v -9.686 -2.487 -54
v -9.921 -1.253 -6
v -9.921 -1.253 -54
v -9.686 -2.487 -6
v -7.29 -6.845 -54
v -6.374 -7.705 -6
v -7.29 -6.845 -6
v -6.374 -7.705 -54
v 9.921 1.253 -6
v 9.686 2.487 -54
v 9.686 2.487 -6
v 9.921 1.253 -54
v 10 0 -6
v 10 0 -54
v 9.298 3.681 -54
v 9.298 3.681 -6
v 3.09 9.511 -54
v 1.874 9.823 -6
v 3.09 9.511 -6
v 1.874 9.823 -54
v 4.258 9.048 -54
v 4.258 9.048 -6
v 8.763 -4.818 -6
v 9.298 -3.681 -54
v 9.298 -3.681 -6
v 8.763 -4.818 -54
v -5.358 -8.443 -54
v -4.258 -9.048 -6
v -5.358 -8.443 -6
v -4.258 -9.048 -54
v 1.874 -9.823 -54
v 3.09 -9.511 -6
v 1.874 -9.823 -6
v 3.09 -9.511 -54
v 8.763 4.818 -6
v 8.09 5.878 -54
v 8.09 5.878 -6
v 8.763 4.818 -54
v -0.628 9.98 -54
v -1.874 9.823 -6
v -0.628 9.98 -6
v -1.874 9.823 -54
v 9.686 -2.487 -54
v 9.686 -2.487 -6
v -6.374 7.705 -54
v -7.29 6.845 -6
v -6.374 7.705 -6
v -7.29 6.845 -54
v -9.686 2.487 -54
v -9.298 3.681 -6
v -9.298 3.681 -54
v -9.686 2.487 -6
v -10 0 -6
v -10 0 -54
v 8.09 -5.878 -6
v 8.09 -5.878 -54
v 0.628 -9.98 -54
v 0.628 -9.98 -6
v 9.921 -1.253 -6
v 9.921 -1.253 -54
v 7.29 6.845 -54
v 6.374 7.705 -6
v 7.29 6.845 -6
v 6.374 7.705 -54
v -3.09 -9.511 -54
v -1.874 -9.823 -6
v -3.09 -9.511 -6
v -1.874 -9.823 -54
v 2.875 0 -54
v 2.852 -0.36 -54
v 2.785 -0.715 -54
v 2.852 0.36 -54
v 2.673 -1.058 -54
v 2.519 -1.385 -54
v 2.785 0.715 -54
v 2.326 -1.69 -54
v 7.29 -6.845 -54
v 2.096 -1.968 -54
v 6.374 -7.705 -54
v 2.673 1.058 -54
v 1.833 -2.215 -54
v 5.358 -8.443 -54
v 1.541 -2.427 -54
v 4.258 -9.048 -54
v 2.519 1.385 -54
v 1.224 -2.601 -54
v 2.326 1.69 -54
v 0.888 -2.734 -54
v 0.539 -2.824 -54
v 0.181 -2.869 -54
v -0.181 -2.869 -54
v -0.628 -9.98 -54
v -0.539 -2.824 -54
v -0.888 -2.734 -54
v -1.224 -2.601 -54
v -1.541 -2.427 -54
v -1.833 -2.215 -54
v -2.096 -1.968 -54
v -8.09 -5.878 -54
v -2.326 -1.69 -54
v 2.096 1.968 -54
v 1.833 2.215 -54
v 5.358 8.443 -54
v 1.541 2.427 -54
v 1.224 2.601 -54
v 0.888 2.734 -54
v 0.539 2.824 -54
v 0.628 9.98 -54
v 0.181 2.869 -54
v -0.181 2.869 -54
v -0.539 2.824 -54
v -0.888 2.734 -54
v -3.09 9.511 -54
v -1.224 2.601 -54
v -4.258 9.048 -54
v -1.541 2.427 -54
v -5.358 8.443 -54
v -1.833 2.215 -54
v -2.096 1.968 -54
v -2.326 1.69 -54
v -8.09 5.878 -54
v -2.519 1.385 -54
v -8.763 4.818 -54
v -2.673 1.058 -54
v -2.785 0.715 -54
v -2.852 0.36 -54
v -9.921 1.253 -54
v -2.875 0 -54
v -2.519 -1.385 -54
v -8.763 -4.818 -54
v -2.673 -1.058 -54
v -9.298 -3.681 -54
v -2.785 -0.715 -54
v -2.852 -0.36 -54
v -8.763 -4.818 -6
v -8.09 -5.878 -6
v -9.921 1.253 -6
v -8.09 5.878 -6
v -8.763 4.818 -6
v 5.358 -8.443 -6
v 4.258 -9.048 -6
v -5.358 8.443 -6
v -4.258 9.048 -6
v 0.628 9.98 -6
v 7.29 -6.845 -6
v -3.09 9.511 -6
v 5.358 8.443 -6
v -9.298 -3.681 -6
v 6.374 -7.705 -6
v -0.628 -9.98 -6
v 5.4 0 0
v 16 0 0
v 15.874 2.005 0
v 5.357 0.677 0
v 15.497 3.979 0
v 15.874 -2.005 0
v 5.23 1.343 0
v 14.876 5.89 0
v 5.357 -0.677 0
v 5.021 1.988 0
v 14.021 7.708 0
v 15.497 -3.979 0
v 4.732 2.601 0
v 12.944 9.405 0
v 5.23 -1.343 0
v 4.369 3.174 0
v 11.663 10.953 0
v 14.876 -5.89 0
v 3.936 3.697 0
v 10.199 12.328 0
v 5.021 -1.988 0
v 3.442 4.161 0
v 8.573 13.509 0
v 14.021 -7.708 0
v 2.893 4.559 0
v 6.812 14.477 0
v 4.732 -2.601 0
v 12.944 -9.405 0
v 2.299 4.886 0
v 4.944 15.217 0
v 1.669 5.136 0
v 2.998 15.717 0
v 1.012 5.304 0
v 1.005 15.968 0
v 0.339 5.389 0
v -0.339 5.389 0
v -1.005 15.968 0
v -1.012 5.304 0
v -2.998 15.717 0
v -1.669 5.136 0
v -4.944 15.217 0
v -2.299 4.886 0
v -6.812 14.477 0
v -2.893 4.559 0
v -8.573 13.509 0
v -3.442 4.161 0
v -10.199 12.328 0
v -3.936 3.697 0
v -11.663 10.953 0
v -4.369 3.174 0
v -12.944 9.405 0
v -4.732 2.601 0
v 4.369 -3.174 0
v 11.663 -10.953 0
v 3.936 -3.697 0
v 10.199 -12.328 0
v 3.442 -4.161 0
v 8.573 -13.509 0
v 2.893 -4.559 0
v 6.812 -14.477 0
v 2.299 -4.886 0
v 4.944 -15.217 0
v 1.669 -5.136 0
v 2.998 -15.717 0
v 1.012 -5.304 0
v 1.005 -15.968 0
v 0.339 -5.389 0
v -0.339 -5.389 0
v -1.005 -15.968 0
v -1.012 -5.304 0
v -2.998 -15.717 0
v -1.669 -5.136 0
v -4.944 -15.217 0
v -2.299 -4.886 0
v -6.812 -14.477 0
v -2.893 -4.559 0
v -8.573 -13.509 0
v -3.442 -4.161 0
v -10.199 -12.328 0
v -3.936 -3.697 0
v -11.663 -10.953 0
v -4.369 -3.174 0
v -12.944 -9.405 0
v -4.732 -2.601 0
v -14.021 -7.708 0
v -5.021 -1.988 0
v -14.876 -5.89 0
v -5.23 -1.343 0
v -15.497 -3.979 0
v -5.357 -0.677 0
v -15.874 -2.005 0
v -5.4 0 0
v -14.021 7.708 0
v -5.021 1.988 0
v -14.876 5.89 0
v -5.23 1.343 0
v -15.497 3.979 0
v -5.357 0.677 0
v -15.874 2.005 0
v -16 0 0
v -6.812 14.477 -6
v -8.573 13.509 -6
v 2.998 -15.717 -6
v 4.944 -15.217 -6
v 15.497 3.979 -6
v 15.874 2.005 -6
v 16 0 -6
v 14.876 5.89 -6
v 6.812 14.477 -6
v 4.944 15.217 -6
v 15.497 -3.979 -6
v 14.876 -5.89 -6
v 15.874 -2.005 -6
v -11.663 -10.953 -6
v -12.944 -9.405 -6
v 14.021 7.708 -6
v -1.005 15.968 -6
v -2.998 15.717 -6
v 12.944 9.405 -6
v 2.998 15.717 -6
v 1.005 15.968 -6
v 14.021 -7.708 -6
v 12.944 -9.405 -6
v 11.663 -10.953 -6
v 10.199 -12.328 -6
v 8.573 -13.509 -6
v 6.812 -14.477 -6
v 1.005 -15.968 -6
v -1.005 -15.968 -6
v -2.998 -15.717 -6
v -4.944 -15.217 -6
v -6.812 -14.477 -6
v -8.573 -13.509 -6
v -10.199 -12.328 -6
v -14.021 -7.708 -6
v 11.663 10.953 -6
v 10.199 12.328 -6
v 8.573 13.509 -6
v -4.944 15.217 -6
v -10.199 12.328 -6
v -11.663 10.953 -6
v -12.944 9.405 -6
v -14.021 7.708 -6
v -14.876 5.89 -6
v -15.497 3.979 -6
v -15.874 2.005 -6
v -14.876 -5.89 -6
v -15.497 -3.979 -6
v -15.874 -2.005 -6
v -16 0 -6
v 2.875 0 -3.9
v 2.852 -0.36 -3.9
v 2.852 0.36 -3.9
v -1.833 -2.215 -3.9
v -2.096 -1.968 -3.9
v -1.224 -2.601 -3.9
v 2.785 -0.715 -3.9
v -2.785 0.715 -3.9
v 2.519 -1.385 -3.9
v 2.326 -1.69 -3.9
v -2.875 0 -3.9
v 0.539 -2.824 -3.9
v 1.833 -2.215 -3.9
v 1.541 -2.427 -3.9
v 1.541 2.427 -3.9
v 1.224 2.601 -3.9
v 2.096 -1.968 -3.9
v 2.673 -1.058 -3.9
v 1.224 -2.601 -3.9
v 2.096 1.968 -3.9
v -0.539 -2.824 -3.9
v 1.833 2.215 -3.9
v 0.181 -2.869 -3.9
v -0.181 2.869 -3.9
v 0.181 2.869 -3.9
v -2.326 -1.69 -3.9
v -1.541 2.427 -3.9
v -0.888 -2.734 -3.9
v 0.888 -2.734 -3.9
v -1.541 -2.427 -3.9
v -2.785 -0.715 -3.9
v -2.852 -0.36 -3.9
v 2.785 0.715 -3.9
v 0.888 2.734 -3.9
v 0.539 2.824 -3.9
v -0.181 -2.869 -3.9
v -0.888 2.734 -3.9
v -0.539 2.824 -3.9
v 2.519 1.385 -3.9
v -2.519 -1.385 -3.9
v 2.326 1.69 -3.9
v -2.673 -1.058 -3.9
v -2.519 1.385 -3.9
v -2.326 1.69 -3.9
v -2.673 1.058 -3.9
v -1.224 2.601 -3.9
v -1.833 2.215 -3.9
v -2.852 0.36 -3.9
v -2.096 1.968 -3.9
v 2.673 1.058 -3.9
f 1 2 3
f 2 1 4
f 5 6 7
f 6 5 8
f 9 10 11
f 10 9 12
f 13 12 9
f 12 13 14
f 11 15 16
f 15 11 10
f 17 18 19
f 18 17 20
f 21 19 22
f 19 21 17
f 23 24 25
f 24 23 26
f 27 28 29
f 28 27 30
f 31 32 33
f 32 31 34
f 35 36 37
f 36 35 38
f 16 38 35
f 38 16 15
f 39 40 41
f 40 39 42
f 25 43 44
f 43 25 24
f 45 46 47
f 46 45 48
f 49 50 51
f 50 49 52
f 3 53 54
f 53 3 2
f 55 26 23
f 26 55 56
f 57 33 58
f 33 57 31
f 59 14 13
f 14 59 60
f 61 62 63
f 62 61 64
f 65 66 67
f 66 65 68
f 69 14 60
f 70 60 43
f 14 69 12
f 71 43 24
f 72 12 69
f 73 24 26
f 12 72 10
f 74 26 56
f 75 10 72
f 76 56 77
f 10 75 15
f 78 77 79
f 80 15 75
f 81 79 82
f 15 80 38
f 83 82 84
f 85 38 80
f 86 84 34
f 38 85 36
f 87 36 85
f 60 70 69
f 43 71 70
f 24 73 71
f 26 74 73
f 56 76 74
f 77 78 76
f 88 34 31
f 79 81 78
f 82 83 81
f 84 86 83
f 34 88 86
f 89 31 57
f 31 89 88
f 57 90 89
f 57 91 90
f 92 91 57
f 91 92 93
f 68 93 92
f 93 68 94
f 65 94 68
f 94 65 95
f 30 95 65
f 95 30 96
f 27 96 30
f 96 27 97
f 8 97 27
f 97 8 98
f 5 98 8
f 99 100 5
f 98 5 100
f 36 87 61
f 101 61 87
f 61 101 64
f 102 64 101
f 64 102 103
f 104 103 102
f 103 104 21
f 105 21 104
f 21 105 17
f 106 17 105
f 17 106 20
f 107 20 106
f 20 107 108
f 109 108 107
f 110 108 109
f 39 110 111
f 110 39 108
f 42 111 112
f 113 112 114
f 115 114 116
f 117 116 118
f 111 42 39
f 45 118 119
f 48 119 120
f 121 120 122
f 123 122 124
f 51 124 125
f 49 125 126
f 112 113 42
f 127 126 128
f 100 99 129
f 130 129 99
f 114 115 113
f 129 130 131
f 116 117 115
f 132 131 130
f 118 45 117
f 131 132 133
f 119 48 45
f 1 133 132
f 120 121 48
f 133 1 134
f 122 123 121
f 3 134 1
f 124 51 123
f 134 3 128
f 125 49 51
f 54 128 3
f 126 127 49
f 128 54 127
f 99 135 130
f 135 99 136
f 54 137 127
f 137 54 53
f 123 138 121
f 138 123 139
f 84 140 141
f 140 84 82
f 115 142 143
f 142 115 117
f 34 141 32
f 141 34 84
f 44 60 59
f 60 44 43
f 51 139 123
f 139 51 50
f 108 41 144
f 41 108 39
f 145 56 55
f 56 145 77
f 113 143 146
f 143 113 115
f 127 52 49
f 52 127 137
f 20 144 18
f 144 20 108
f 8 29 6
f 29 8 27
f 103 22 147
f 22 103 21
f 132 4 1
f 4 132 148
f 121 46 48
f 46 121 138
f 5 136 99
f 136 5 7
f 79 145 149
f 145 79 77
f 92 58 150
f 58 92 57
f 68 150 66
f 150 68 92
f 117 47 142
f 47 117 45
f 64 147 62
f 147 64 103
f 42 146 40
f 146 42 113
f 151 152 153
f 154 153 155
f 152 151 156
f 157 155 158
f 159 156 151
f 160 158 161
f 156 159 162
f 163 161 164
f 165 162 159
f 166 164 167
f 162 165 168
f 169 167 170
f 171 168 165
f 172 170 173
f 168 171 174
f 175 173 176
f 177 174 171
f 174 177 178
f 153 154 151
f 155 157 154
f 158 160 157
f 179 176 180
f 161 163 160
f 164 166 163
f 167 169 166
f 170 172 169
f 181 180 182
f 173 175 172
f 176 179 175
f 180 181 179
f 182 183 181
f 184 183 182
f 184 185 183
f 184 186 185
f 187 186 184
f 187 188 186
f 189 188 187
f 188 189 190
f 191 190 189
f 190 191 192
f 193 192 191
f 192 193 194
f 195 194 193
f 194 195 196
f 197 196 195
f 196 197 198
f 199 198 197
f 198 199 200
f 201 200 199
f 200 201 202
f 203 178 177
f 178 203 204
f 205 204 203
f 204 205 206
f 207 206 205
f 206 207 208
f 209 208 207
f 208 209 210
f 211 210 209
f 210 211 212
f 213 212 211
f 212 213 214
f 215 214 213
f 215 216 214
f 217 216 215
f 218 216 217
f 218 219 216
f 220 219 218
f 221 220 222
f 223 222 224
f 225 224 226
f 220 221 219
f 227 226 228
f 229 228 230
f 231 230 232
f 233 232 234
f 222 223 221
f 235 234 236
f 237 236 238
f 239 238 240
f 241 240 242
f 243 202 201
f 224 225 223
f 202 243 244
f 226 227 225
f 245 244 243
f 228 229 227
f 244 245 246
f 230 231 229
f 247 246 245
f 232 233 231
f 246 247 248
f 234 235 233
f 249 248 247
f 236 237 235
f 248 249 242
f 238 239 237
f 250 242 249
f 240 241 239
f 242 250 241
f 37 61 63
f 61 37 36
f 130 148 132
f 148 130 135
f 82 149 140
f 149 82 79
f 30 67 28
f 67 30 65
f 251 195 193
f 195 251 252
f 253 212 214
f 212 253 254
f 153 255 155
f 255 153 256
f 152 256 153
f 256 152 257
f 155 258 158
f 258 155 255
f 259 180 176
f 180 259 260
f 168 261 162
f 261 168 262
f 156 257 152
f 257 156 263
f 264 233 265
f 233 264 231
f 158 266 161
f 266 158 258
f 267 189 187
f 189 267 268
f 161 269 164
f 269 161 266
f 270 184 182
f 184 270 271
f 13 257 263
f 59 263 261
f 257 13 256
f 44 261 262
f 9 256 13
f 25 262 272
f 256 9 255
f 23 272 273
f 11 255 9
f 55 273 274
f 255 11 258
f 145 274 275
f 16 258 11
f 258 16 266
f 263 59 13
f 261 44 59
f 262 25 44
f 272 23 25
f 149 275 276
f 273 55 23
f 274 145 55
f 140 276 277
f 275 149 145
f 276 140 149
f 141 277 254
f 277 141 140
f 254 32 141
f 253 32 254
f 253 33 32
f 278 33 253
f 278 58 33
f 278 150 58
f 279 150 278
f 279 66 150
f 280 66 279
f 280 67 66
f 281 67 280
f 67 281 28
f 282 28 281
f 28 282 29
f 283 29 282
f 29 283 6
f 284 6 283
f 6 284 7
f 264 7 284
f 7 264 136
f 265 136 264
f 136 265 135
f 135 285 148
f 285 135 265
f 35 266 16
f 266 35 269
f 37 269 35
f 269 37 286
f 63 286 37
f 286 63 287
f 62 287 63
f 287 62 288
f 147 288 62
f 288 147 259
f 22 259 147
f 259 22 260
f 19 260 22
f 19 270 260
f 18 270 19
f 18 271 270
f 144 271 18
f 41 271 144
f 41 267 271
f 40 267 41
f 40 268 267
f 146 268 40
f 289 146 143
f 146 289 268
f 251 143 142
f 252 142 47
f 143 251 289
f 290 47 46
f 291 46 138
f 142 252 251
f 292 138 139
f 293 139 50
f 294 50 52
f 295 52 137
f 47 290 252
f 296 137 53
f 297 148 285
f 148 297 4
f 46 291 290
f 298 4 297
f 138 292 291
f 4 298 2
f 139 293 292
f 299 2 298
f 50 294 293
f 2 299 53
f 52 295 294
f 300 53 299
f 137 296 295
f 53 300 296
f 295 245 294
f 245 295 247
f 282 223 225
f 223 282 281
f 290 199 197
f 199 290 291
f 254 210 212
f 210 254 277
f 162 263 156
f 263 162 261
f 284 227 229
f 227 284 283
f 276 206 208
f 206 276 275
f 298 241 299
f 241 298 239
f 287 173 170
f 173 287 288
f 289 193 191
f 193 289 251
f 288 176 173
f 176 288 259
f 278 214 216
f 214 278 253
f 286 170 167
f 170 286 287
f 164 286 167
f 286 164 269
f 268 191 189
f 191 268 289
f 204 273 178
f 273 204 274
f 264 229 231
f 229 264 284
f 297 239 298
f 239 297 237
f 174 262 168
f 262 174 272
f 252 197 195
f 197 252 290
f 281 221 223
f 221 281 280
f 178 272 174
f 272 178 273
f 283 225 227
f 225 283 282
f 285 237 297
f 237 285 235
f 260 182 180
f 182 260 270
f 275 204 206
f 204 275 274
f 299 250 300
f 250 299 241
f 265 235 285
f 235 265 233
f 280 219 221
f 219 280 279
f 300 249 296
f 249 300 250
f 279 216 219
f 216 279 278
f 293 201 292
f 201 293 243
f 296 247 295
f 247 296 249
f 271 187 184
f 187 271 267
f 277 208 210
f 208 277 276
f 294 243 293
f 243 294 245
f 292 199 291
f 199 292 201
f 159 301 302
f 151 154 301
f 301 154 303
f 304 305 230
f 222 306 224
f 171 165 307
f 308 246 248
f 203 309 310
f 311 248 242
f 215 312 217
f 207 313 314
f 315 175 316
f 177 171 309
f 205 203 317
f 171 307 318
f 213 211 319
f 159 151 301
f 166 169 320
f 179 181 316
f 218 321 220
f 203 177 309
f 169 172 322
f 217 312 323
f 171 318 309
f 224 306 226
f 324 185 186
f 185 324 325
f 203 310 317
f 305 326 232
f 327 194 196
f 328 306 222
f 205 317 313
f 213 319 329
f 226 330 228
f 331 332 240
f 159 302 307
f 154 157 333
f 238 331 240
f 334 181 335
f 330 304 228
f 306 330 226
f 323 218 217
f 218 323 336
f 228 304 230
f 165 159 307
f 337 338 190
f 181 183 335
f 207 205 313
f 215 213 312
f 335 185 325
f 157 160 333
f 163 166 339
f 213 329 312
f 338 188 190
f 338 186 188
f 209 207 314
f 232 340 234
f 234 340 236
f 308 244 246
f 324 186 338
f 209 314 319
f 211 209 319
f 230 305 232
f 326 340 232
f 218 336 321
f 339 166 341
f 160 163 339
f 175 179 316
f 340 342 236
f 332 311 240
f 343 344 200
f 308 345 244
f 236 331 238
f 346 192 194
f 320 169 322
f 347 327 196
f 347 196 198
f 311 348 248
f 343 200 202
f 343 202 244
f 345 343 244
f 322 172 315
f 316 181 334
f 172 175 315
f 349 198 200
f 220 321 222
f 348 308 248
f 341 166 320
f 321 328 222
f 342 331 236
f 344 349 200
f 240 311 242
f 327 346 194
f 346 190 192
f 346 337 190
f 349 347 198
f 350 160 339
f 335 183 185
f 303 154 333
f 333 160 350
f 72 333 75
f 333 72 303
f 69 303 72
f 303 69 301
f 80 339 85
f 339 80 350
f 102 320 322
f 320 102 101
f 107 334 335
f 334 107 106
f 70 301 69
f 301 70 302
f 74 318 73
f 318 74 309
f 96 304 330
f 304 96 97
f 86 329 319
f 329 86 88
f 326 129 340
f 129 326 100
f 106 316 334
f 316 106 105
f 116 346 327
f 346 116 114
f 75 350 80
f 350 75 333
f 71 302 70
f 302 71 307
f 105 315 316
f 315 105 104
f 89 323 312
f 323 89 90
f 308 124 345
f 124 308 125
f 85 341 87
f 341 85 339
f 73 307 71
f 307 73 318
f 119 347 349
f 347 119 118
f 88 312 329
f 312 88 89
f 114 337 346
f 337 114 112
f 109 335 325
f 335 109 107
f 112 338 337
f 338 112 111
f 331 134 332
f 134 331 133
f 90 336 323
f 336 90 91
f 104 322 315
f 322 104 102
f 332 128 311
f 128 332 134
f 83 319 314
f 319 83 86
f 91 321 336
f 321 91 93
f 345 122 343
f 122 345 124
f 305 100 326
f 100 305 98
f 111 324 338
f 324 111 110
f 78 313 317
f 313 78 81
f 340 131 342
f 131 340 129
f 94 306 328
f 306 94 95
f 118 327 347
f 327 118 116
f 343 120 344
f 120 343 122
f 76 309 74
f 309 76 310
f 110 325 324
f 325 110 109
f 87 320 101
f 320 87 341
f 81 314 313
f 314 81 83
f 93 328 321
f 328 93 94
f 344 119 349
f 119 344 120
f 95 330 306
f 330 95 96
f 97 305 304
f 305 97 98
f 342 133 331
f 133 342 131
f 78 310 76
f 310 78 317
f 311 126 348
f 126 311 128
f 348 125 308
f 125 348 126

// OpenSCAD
$fn = 50;


difference() {
	union() {
		translate(v = [0, 0, -54.0000000000]) {
			cylinder(h = 54, r = 10.0000000000);
		}
		translate(v = [0, 0, -6.0000000000]) {
			cylinder(h = 6, r = 16.0000000000);
		}
	}
	union() {
		translate(v = [0, 0, 0]) {
			rotate(a = [0, 0, 0]) {
				difference() {
					union() {
						#translate(v = [0, 0, -54.0000000000]) {
							cylinder(h = 54, r = 2.6000000000);
						}
						#translate(v = [0, 0, -3.9000000000]) {
							cylinder(h = 3.9000000000, r1 = 2.8750000000, r2 = 5.4000000000);
						}
						#translate(v = [0, 0, -54.0000000000]) {
							cylinder(h = 54, r = 2.8750000000);
						}
						#translate(v = [0, 0, -54.0000000000]) {
							cylinder(h = 54, r = 2.6000000000);
						}
					}
					union();
				}
			}
		}
	}
}
